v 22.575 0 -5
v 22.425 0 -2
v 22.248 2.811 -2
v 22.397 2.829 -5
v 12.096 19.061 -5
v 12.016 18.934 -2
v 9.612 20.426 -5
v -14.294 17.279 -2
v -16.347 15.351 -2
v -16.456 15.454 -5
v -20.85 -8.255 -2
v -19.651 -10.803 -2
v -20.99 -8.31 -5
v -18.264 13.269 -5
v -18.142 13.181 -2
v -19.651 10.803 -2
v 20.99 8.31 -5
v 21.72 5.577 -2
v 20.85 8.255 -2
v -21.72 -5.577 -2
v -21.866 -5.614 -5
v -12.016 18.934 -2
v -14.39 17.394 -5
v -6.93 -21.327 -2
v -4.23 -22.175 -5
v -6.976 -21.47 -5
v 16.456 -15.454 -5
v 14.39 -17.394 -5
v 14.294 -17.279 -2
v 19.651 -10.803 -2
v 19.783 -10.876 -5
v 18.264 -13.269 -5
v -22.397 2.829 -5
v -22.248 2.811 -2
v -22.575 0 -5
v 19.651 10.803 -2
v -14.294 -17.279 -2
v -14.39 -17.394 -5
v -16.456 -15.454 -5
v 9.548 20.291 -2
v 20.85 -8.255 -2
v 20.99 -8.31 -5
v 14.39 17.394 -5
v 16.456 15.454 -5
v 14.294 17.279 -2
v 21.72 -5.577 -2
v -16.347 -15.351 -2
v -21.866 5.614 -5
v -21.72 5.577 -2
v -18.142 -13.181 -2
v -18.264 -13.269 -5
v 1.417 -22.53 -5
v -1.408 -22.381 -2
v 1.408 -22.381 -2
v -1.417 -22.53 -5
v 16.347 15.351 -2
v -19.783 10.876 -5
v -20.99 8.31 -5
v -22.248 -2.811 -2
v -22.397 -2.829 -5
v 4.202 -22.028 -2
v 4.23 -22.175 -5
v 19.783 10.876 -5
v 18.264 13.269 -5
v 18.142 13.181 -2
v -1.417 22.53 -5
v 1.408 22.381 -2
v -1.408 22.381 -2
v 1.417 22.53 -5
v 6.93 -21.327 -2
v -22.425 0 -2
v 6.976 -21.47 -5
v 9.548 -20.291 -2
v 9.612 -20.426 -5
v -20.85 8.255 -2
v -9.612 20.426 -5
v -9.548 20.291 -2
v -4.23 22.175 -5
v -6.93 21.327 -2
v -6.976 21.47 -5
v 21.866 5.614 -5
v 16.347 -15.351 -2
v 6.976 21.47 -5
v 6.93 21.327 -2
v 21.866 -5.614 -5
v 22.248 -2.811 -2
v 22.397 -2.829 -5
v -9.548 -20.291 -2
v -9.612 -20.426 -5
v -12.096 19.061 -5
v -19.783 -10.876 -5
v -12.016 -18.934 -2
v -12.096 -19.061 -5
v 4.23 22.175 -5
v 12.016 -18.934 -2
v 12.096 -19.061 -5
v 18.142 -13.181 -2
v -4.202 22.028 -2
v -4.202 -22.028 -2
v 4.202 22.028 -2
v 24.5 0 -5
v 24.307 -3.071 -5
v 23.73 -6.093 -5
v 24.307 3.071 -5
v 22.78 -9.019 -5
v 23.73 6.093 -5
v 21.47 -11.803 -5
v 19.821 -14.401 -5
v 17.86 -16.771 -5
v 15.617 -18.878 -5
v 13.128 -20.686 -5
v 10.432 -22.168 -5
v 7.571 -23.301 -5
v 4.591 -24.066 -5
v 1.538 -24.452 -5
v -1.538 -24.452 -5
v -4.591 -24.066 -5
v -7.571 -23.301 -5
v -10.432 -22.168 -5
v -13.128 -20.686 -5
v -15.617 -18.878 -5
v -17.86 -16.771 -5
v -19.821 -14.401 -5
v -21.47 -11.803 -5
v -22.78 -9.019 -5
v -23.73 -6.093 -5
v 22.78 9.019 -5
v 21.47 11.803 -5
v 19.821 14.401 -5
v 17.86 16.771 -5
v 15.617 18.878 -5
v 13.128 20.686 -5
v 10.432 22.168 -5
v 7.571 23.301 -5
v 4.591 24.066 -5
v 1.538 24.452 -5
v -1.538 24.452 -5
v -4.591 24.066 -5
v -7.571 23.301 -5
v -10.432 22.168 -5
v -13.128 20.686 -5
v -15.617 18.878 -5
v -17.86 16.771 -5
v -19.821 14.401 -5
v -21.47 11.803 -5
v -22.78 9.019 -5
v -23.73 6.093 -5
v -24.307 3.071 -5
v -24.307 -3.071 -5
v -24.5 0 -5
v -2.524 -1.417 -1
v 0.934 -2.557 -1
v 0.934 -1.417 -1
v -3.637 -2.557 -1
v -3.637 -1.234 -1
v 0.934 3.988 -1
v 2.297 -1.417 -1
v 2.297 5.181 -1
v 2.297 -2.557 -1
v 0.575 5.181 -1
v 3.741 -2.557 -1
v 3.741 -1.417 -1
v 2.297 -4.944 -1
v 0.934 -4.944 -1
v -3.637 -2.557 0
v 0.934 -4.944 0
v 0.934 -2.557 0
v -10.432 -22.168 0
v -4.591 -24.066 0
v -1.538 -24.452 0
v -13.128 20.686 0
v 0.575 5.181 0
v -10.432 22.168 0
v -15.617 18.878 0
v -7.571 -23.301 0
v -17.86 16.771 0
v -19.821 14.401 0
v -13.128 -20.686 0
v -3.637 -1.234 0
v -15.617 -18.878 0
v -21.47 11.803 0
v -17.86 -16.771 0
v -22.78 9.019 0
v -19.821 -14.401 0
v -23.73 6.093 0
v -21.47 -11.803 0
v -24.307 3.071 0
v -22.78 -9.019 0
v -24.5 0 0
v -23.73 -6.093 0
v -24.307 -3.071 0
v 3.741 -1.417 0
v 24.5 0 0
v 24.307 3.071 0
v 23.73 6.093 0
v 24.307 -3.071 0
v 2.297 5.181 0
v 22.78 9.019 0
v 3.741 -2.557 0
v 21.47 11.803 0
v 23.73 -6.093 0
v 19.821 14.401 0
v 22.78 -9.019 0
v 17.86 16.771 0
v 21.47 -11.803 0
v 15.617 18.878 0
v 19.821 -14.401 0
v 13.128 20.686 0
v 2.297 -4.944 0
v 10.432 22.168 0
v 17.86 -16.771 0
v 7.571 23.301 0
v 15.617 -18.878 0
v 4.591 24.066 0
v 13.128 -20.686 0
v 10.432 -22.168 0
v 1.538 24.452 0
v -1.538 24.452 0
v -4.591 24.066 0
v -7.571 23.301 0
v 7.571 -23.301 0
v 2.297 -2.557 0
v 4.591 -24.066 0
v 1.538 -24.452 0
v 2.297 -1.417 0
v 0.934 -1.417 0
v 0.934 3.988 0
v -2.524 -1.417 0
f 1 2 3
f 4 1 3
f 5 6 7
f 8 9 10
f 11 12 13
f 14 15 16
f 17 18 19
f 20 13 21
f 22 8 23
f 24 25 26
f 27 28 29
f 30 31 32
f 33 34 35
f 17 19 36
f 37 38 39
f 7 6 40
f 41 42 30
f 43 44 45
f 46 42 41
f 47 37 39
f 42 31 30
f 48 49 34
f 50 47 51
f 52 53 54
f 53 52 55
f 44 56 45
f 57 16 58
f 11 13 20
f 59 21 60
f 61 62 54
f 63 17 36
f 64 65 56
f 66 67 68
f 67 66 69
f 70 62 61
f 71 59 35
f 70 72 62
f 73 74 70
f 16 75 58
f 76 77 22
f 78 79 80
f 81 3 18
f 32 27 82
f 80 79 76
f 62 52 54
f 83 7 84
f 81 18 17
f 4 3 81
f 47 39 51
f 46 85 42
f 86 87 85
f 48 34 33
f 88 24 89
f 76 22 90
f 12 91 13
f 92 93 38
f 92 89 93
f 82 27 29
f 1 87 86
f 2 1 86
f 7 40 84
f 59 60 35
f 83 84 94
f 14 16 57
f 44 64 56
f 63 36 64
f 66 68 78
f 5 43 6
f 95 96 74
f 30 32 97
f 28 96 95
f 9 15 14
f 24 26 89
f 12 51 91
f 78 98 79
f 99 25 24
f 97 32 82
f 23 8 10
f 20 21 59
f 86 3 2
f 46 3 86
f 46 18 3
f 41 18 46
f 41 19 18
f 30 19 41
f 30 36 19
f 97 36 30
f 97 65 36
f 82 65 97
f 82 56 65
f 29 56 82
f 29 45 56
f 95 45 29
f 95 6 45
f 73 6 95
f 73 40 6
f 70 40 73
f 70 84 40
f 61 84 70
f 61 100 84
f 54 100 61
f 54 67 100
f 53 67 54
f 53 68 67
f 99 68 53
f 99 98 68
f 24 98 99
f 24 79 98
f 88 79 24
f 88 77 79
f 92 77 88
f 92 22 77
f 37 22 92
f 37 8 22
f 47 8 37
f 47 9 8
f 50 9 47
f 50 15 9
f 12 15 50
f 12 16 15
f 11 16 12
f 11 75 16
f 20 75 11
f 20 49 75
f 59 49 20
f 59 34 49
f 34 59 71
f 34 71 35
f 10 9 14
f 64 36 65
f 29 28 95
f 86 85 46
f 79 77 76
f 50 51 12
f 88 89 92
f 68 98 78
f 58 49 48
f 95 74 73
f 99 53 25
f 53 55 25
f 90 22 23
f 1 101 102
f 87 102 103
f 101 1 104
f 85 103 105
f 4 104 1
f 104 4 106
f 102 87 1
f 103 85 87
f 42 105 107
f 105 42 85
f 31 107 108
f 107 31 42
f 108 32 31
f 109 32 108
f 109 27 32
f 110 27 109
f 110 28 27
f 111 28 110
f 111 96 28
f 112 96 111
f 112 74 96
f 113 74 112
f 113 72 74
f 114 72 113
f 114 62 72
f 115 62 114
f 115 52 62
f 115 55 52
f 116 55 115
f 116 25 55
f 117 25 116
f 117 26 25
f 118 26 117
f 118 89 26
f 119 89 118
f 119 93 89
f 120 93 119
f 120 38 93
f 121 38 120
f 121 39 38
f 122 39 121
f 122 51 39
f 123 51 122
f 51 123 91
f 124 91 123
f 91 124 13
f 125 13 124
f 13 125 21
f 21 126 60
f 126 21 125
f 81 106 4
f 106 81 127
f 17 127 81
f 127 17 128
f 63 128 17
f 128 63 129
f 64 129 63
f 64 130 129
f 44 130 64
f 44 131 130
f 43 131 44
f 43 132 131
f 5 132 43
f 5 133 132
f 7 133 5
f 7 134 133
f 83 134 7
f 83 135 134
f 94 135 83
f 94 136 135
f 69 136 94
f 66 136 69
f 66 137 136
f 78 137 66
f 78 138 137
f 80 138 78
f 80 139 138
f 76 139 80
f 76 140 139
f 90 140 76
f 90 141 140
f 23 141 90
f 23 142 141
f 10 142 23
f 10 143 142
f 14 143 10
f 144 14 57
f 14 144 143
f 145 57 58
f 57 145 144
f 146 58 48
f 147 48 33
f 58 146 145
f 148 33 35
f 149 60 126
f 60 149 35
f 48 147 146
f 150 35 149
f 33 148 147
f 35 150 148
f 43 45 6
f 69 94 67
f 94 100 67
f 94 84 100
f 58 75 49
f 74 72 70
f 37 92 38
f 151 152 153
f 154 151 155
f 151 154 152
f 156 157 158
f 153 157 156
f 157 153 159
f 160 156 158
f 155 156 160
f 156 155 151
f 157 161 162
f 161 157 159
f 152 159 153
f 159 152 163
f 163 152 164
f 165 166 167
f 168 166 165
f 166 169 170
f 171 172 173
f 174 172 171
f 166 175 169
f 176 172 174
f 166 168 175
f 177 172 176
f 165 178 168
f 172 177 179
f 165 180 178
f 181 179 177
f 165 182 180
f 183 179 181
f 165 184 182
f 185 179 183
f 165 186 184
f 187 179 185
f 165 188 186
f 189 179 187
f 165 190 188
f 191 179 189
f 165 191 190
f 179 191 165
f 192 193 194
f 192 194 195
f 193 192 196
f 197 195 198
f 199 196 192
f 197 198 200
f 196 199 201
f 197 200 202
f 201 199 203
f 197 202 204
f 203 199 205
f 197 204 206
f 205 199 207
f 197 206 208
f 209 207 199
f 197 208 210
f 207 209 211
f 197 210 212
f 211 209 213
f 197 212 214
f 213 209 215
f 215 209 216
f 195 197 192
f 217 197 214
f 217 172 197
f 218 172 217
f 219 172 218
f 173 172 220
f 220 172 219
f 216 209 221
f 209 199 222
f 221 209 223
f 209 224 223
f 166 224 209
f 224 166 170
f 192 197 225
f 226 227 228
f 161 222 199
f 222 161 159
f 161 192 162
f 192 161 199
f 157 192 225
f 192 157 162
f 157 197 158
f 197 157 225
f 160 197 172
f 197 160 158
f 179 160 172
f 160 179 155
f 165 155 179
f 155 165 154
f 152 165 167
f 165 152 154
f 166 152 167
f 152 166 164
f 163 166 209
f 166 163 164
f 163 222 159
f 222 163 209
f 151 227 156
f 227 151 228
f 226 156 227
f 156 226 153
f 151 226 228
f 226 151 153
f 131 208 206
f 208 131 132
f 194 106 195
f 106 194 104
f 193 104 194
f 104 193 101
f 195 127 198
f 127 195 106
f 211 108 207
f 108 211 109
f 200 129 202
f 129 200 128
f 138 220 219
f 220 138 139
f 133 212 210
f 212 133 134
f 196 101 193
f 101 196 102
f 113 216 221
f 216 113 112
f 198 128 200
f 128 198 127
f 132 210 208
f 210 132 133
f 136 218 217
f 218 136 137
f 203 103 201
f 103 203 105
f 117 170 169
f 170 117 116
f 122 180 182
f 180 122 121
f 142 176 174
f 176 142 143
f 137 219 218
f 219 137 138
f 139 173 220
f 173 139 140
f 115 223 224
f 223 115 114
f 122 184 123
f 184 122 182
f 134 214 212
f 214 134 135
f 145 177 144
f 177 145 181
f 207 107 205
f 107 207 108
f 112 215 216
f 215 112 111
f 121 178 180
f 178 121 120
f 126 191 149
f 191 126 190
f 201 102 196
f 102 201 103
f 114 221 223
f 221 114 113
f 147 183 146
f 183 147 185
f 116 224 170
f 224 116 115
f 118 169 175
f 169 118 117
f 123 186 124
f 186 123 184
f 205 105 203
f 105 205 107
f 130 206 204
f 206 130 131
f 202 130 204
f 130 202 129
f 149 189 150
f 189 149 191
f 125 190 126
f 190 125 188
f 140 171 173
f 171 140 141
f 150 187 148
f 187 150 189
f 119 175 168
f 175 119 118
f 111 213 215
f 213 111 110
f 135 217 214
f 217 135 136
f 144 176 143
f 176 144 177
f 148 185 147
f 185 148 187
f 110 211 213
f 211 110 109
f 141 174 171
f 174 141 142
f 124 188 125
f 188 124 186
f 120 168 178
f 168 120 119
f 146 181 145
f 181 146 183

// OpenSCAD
$fn = 50;

difference() {
	union() {
		translate(v = [0, 0, -5.0]) {
			cylinder(h = 5, r = 24.5);
		}
	}
	union() {
		#translate(v = [0, 0, -5.0]) {
			cylinder(h = 3, r1 = 22.575, r2 = 22.425);
		}
		translate(v = [0, 0, -1]) {
			linear_extrude(height = 1) {
				text(font = "Impact", halign = "center", size = 10, text = "4", valign = "center");
			}
		}
	}
}
